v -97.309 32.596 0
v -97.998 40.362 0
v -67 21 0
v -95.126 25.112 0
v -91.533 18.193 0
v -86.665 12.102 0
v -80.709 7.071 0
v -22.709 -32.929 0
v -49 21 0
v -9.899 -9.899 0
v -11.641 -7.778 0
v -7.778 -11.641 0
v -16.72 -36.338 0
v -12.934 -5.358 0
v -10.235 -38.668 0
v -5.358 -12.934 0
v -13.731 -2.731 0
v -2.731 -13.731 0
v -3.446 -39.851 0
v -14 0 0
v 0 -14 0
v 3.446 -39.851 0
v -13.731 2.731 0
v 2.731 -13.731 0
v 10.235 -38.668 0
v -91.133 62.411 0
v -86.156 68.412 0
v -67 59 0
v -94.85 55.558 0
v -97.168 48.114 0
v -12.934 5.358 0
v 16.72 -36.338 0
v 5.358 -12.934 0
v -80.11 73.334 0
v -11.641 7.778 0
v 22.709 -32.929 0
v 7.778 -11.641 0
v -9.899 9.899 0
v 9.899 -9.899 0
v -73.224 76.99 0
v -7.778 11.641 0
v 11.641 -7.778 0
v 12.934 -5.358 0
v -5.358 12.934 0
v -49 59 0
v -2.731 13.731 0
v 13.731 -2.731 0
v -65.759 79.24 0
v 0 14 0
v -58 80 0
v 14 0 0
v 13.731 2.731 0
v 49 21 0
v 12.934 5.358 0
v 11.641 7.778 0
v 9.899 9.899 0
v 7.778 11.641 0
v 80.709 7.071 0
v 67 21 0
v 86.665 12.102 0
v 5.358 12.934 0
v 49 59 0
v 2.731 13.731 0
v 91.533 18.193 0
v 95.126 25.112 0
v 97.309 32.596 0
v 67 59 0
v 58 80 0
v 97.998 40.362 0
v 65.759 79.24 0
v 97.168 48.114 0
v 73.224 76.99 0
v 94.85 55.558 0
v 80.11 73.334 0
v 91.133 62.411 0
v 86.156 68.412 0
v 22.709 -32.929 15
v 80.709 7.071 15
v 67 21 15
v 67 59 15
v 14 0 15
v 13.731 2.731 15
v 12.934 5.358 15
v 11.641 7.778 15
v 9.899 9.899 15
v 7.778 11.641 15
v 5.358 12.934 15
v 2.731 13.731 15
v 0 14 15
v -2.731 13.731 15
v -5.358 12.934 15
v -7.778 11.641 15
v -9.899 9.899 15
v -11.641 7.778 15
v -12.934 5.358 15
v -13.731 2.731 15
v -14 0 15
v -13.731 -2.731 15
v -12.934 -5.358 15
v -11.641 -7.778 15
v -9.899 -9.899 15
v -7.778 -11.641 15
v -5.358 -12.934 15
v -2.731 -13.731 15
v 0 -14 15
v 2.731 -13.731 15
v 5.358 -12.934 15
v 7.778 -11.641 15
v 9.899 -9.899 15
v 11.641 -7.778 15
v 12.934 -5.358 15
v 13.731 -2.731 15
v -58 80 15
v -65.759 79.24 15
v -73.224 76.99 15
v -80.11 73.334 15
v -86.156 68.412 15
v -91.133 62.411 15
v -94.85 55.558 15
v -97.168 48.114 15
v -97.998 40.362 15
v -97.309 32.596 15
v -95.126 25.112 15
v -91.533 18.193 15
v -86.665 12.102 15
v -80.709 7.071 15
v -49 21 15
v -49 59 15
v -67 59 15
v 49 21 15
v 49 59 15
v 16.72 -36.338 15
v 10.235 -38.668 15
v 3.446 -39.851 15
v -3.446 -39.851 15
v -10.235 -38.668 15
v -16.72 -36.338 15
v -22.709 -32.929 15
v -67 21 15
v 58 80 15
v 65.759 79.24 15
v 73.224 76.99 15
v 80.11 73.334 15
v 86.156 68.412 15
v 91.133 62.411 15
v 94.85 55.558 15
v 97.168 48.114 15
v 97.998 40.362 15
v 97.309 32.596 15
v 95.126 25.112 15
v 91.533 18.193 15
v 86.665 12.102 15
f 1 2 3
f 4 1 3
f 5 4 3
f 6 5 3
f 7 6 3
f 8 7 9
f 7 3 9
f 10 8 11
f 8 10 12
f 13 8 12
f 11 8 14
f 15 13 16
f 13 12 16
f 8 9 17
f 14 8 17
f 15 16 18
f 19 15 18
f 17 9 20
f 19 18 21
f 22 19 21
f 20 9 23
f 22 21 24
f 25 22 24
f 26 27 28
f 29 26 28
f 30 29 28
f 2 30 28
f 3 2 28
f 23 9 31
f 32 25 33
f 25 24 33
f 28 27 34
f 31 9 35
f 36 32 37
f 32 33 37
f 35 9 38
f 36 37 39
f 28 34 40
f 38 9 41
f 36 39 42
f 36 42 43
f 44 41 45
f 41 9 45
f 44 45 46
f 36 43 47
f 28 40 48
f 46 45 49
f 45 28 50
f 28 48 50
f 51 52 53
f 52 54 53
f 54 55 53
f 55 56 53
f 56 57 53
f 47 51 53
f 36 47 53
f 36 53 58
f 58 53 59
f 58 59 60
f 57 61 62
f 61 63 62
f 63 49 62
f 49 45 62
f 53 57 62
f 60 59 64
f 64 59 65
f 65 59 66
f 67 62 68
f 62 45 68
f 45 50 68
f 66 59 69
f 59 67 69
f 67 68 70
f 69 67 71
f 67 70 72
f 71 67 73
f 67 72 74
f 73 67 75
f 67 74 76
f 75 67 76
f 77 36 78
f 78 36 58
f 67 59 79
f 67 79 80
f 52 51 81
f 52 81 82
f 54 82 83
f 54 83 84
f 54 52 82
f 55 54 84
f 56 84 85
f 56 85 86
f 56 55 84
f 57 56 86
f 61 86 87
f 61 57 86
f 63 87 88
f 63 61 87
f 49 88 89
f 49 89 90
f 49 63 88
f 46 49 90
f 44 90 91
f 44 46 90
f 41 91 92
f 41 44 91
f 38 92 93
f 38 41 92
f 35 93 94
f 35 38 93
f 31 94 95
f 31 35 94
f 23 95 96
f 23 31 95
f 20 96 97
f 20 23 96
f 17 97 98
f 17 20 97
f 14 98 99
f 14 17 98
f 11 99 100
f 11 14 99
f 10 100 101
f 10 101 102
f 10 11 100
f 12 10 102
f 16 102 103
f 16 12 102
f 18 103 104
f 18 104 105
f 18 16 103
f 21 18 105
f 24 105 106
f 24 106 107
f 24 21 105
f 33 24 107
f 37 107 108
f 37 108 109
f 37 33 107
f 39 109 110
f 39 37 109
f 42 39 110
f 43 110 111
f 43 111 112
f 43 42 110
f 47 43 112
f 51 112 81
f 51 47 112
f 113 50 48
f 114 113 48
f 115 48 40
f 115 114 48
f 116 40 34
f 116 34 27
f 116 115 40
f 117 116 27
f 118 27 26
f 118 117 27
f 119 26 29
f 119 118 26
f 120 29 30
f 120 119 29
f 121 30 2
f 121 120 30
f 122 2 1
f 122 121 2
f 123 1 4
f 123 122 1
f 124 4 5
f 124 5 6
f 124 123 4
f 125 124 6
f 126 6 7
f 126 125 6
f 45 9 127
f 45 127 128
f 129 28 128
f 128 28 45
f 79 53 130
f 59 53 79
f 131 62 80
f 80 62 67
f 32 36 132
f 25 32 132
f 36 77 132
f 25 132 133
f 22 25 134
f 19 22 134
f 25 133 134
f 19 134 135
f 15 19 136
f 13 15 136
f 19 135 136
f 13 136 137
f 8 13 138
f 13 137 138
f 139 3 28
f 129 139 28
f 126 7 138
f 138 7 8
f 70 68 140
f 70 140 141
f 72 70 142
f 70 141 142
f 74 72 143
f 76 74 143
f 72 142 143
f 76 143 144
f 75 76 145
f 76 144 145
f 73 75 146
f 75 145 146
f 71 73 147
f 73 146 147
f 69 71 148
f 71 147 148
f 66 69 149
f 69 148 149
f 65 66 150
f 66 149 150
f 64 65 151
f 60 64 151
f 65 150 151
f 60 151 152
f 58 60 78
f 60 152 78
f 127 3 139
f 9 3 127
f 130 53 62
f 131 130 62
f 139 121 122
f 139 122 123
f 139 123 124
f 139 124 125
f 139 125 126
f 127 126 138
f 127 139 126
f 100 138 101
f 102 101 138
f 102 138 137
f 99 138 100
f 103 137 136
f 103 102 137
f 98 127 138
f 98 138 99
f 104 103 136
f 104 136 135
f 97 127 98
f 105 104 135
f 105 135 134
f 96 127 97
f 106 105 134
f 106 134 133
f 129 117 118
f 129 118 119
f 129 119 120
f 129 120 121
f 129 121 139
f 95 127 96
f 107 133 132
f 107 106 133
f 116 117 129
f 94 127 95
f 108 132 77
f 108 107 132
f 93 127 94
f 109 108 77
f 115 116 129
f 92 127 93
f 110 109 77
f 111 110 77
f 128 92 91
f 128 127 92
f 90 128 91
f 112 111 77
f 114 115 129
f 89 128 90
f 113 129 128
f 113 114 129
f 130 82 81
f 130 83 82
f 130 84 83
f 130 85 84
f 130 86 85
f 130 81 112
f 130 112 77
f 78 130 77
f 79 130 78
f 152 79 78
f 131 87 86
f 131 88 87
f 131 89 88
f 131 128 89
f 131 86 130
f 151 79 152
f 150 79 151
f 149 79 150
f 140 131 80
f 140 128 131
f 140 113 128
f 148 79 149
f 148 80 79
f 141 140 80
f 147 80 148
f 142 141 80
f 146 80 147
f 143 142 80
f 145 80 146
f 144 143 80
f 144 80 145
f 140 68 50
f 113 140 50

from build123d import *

# Parameters (mm, degrees)
SKETCH1_R           = 14
SKETCH1_W           = 18
SKETCH1_H           = 38
BOSS_EXTRUDE1_DEPTH = 15
FILLET1_R           = 40


with BuildPart() as part:
    # Sketch1 → Boss-Extrude1 (new body)
    with BuildSketch(Plane.XY):
        Polygon((186.455659815, 80), (-186.455659815, 80), (0, -48.590110217), align=None)
        Circle(SKETCH1_R, mode=Mode.SUBTRACT)
        with Locations((-58, 40)):
            Rectangle(SKETCH1_W, SKETCH1_H, mode=Mode.SUBTRACT)
        with Locations((58, 40)):
            Rectangle(SKETCH1_W, SKETCH1_H, mode=Mode.SUBTRACT)
    extrude(amount=BOSS_EXTRUDE1_DEPTH)

    # Fillet1
    fillet1_edges = [part.edges().sort_by_distance(p)[0] for p in [
        (0, -48.590110217, 7.5),
        (-186.455659815, 80, 7.5),
        (186.455659815, 80, 7.5),
    ]]
    fillet(fillet1_edges, radius=FILLET1_R)


solid = part.part
